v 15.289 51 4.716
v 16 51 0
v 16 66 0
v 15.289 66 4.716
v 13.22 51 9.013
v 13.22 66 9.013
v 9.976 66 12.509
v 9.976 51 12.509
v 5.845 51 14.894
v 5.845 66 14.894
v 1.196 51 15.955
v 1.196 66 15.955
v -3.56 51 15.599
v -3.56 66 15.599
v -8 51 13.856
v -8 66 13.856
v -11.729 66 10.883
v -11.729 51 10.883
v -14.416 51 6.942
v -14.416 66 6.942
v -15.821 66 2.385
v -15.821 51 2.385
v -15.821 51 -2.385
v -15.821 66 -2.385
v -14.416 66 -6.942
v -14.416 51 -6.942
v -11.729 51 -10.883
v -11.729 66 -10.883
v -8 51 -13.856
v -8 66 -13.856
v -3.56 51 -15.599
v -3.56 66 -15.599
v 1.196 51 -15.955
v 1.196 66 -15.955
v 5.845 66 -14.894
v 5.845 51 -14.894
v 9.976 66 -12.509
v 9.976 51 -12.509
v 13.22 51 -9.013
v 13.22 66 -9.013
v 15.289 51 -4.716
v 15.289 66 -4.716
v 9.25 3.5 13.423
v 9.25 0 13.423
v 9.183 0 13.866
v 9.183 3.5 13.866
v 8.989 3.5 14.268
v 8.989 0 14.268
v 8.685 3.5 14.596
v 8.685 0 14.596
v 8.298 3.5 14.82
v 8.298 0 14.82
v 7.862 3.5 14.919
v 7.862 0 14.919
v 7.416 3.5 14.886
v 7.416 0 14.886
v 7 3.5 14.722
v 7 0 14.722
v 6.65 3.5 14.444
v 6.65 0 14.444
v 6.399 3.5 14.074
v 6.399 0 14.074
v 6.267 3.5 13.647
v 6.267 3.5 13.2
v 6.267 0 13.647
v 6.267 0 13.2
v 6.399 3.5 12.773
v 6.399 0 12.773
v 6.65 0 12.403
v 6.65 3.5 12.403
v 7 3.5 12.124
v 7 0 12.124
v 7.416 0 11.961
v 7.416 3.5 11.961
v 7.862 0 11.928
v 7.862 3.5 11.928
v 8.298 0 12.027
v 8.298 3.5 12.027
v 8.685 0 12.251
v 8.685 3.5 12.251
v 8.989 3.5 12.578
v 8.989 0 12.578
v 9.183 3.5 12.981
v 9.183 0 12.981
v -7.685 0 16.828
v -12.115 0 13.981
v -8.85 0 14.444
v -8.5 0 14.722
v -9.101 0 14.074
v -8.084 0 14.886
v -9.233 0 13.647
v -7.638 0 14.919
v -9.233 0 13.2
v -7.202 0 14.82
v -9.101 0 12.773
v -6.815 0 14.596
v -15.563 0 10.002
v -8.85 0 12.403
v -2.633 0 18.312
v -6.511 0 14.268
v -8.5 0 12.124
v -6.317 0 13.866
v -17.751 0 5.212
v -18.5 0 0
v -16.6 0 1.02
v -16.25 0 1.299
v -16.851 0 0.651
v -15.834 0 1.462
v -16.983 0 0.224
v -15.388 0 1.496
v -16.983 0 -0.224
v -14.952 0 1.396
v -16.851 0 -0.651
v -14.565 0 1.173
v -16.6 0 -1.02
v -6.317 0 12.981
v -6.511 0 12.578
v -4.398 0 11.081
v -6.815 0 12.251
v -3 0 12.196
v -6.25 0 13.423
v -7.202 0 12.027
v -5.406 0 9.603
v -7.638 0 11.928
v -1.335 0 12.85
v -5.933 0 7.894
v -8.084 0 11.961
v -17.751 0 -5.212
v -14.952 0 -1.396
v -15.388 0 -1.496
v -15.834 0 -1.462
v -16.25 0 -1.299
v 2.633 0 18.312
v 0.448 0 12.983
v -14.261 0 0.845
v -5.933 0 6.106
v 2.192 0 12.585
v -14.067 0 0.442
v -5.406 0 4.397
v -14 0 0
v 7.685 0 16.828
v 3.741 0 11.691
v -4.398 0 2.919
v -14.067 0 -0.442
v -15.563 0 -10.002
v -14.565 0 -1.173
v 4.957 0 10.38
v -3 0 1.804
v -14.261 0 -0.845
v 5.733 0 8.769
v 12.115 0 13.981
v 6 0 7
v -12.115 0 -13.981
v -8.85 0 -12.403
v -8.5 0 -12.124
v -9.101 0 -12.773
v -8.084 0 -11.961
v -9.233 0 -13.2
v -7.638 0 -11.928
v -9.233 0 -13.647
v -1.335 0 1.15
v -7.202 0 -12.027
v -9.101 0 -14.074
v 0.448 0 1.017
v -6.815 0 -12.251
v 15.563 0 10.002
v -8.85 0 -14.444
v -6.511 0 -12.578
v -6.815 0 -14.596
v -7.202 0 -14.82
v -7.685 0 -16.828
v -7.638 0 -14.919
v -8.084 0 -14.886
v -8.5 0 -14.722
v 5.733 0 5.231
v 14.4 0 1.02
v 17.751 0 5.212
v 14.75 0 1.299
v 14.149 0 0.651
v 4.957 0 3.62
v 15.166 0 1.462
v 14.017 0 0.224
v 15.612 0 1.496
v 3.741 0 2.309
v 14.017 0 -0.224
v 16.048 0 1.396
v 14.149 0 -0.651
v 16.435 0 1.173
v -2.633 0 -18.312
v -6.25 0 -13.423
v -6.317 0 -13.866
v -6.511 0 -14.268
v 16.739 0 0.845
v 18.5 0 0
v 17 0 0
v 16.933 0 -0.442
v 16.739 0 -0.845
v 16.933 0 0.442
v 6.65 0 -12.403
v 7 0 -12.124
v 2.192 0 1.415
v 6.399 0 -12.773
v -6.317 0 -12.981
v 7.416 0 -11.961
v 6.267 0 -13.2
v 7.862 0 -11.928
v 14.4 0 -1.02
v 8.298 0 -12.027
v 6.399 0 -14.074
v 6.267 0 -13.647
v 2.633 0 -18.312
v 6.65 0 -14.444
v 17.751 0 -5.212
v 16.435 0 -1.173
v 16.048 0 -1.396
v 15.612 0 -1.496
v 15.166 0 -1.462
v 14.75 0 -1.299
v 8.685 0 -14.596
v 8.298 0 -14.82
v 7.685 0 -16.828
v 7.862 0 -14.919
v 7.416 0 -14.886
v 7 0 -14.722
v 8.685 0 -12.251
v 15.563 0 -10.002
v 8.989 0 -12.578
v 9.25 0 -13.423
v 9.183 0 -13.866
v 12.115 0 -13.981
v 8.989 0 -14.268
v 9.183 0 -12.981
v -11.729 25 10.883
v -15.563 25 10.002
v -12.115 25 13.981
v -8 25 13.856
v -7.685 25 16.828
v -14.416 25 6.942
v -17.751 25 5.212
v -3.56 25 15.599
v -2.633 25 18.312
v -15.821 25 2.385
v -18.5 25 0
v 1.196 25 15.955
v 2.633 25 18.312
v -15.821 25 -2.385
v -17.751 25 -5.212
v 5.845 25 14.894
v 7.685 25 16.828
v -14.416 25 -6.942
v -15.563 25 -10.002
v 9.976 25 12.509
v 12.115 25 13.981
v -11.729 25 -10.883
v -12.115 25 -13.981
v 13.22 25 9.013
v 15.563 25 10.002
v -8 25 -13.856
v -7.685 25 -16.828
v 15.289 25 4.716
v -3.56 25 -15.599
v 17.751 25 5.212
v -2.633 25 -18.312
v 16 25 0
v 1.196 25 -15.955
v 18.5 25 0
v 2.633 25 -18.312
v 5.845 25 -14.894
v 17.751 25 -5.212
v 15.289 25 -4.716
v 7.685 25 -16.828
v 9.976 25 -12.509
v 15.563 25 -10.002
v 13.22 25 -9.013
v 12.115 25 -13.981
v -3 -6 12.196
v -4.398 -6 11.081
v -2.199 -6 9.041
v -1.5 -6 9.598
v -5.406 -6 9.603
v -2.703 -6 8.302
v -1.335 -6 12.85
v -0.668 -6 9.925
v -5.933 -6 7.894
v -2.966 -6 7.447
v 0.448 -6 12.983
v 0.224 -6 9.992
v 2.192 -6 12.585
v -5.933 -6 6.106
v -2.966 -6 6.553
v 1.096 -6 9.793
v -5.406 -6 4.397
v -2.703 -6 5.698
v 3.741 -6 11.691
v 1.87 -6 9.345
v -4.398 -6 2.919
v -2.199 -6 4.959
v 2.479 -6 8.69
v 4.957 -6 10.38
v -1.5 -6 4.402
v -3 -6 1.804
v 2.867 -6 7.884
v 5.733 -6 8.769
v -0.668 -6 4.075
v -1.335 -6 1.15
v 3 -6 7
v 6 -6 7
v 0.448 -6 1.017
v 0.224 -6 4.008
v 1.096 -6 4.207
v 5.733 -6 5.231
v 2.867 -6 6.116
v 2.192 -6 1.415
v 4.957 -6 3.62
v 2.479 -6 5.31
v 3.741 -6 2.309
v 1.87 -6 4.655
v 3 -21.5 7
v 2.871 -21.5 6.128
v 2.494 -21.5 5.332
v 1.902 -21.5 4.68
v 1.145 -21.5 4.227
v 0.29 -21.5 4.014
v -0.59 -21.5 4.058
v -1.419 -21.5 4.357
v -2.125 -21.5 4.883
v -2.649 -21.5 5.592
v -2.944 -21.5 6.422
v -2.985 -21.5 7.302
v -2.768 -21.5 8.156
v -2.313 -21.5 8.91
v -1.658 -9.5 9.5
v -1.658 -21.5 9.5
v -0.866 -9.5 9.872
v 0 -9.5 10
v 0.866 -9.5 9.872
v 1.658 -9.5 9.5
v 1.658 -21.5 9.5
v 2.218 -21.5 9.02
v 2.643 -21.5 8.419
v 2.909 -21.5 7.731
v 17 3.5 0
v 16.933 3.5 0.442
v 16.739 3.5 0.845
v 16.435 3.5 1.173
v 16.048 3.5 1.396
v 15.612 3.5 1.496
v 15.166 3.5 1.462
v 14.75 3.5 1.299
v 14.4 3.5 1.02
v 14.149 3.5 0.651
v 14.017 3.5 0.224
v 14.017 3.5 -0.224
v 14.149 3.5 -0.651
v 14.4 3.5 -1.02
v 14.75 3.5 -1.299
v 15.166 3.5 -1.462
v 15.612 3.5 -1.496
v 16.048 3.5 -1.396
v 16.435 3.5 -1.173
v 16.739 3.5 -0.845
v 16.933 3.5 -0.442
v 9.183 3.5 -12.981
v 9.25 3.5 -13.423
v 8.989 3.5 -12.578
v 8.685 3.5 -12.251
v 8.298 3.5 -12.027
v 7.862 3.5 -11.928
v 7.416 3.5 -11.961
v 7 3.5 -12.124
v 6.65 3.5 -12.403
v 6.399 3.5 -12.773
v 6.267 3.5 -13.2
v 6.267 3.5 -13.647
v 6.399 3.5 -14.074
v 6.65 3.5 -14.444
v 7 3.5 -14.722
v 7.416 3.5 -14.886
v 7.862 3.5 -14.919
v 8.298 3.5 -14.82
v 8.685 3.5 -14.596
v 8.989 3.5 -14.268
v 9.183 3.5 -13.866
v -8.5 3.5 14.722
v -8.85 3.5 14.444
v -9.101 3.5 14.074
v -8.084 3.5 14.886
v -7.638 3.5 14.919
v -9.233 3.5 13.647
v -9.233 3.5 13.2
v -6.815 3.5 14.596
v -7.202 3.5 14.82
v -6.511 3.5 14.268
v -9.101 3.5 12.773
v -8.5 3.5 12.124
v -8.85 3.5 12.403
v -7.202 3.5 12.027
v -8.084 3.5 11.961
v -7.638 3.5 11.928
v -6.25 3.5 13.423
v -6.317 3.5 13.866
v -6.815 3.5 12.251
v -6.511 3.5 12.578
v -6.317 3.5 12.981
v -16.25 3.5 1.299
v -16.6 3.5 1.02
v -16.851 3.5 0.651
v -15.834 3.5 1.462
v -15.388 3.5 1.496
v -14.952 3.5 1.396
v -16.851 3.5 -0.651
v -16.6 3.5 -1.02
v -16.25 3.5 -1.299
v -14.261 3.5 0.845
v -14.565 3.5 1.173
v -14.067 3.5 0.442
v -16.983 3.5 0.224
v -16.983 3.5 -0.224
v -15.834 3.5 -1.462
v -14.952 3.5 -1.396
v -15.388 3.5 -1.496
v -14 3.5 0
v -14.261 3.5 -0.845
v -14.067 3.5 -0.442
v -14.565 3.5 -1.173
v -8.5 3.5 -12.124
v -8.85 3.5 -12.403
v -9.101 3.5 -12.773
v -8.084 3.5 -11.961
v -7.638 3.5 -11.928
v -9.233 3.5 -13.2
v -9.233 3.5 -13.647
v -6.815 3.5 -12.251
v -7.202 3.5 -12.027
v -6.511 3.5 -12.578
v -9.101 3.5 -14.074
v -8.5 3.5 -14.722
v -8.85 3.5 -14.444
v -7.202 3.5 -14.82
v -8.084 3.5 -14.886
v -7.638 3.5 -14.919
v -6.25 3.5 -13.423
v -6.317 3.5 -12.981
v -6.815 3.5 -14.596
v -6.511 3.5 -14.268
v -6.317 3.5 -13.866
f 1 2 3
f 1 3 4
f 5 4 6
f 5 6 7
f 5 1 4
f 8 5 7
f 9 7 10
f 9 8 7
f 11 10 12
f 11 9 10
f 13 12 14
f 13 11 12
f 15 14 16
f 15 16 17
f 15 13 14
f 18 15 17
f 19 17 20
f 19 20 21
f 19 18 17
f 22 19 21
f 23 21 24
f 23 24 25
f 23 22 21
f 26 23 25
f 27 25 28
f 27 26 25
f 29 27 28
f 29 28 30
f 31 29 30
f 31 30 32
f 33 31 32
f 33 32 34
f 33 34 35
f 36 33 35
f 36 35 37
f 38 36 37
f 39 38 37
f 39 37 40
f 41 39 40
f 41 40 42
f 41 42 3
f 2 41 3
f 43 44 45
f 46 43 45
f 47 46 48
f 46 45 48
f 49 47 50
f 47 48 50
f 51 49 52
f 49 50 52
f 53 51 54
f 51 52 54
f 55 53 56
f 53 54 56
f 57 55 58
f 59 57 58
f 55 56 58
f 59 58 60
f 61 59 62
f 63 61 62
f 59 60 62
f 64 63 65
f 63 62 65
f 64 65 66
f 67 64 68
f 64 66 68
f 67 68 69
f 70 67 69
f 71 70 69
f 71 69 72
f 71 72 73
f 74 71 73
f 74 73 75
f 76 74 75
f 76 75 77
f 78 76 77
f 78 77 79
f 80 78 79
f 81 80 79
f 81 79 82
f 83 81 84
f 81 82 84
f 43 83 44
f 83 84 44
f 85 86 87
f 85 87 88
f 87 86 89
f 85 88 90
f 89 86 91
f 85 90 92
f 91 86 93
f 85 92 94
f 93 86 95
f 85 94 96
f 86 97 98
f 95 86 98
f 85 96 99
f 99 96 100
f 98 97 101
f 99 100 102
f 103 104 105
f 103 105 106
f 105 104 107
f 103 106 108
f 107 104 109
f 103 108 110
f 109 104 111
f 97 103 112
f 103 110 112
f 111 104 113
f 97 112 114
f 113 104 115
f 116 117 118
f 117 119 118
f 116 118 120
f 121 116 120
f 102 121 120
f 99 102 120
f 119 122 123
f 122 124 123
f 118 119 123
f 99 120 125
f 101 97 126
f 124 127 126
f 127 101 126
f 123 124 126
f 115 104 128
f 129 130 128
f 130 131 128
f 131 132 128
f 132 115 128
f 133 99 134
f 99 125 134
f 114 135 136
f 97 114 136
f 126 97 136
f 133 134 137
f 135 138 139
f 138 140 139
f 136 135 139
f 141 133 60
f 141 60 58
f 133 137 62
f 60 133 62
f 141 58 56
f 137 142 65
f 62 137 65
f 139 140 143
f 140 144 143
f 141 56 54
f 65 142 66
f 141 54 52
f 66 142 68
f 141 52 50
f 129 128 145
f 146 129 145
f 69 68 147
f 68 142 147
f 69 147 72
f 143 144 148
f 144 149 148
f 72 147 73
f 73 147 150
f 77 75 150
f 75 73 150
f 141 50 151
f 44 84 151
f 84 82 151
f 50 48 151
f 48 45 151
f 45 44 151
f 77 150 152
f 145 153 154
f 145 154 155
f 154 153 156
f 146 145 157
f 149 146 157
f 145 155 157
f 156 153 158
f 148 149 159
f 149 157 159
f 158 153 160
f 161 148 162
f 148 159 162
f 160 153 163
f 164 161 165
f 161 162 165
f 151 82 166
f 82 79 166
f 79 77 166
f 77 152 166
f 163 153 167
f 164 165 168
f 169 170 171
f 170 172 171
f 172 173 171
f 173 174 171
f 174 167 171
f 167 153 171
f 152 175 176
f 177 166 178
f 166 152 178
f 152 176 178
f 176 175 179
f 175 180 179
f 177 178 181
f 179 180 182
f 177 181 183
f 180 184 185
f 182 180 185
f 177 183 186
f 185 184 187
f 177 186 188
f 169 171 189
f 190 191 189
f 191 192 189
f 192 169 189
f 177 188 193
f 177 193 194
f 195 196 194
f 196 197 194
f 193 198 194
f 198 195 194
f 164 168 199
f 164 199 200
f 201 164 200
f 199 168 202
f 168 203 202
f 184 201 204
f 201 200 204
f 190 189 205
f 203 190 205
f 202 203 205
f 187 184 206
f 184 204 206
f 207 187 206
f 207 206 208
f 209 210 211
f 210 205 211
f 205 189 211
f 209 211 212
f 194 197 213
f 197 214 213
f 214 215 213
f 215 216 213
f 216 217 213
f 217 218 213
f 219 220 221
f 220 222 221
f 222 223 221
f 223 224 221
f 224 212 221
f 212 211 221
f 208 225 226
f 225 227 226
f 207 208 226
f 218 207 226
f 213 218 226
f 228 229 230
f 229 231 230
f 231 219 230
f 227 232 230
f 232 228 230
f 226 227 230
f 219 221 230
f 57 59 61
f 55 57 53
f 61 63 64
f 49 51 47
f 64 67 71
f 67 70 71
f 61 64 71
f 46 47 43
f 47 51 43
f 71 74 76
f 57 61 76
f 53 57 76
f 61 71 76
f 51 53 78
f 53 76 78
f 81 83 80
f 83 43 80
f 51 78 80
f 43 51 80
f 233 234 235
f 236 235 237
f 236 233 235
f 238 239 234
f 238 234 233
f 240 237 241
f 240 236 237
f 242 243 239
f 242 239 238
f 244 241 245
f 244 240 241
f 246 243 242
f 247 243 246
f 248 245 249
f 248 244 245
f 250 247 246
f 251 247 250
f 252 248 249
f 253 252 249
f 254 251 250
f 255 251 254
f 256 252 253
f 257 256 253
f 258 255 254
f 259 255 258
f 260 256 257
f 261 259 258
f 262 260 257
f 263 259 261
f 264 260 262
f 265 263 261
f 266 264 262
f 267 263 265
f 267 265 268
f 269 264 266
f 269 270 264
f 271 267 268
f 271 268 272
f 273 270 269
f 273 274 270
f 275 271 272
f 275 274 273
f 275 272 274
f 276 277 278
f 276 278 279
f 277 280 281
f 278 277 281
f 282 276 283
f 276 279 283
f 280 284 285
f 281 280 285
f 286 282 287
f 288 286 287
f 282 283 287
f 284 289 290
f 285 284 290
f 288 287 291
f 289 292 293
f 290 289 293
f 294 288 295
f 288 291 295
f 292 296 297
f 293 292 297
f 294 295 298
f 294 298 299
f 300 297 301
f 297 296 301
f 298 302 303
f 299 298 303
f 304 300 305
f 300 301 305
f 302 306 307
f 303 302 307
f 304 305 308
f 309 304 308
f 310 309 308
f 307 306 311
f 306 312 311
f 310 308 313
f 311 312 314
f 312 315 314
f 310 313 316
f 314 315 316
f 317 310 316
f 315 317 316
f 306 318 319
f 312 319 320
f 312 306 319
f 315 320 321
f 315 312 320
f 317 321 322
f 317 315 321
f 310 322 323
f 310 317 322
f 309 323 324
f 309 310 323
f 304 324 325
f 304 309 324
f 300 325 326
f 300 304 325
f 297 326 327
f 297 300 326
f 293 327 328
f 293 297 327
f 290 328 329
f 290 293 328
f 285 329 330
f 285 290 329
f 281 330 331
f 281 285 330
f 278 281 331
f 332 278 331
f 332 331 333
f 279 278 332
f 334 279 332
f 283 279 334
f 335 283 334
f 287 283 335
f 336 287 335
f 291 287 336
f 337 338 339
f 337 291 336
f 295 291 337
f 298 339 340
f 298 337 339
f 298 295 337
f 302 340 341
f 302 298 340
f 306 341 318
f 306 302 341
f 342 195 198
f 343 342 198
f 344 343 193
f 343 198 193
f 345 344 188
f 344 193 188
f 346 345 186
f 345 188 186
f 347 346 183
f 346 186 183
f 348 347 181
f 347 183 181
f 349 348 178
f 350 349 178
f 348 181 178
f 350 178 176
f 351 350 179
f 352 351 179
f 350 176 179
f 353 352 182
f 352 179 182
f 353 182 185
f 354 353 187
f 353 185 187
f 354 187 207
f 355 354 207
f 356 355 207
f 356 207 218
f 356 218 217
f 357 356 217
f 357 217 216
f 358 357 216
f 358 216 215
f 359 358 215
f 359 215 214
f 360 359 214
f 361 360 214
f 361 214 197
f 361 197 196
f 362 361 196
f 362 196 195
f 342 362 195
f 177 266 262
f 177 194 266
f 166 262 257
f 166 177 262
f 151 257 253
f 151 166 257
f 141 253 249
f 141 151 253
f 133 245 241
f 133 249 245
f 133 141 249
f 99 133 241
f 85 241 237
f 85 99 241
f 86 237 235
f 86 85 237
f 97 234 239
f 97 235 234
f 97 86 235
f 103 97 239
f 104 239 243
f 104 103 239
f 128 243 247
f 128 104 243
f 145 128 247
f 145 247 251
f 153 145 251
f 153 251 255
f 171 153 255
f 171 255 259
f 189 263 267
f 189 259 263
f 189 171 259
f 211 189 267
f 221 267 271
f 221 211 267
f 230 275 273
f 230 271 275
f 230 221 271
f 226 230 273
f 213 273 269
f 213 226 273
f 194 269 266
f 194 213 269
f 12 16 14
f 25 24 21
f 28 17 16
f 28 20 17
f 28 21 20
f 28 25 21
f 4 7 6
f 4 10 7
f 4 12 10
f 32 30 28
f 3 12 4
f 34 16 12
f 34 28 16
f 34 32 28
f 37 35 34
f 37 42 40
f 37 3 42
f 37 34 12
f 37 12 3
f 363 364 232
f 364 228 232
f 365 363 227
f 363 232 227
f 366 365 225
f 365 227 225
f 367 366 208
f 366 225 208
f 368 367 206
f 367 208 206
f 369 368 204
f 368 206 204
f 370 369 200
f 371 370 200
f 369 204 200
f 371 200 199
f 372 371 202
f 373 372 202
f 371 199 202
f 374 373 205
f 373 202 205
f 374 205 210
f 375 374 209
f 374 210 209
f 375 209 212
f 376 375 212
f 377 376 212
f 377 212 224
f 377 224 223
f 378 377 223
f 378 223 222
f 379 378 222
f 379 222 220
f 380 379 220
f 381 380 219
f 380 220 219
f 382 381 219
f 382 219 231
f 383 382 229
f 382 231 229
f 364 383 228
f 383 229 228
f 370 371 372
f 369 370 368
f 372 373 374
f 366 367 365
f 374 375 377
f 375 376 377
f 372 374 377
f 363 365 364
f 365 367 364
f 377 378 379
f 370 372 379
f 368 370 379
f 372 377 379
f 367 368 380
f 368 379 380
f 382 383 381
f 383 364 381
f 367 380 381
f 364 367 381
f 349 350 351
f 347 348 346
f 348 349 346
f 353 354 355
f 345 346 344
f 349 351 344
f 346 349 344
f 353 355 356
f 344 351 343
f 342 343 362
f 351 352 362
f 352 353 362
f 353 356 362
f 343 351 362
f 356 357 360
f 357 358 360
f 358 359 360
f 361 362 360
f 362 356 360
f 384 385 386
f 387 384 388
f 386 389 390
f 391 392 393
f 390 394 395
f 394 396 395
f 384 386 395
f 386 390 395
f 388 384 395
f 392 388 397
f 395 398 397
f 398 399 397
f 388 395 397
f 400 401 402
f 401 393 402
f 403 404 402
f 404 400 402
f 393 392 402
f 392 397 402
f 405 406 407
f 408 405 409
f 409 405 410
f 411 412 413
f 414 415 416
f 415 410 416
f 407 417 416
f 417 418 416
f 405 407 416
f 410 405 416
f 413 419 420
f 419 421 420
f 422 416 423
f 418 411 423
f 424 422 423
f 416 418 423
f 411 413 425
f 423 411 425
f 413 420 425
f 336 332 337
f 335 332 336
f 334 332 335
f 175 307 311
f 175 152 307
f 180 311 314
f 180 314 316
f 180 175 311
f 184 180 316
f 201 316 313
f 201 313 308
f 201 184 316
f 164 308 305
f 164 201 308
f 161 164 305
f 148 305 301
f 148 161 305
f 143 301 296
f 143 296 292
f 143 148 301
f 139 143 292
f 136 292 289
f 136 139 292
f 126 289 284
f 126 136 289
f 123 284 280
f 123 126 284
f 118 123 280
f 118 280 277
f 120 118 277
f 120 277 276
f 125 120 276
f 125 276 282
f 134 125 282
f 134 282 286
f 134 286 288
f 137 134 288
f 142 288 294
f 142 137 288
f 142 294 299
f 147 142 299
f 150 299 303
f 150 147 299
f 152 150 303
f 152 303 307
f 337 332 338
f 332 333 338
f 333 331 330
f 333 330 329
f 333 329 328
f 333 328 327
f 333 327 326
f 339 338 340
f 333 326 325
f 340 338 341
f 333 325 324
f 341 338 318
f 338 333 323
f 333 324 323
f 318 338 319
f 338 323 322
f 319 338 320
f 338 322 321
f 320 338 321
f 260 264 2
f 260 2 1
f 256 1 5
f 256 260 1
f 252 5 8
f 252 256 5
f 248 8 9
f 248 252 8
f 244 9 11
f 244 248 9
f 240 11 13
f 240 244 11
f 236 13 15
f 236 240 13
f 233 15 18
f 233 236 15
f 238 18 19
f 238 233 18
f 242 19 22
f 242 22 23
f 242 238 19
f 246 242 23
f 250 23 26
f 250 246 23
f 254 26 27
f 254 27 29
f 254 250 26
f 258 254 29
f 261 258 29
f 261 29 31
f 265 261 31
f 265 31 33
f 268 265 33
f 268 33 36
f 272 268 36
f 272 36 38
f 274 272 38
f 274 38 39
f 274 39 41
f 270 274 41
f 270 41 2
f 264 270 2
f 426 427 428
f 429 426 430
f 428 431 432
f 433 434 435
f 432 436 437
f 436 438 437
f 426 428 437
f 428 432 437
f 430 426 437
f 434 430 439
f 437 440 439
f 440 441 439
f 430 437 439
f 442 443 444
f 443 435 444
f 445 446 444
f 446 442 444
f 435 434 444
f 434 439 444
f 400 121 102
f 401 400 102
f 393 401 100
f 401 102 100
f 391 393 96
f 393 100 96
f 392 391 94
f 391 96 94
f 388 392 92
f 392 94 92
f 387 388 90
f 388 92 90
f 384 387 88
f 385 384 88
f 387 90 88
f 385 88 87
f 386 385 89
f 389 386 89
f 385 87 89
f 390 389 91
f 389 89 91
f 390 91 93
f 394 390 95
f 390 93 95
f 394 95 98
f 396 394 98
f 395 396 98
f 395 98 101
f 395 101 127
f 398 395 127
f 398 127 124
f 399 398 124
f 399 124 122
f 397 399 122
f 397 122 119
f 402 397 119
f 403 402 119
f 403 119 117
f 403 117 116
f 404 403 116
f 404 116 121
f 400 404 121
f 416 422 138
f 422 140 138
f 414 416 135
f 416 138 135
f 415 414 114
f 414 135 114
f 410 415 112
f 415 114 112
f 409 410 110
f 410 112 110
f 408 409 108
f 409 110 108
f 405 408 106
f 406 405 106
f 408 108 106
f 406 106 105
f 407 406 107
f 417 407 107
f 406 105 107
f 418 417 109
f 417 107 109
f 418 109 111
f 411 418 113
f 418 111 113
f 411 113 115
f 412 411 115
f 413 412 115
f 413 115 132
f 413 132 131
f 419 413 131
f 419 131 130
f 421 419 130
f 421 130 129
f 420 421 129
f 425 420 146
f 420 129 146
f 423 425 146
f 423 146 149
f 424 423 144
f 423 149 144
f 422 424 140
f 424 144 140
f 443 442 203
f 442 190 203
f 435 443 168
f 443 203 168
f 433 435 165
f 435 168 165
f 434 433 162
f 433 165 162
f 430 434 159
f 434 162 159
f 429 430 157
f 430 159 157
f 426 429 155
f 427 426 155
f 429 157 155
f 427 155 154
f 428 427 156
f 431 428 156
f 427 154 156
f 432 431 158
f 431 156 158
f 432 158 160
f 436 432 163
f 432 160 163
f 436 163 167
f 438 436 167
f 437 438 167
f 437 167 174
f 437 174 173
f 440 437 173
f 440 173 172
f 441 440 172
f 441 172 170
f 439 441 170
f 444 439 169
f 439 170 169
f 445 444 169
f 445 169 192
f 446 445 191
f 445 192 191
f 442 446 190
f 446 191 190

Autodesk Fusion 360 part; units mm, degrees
sketch "Sketch1" plane through (0, 0, 0) normal (0, 1, 0) x (1, 0, 0)
  circle A0 centre (0, 0) radius 18.5
  circle A1 centre (0, 0) radius 16
  circle A2 centre (0, 0) radius 15.5 construction
  line L0 (-18.5, 0) -> (18.5, 0) construction
  circle A3 centre (15.5, 0) radius 1.5
  circle A4 centre (-15.5, 0) radius 1.5
  line L1 (9.25, -16.0215) -> (-9.25, 16.0215) construction
  line L2 (9.25, 16.0215) -> (-9.25, -16.0215) construction
  circle A5 centre (7.75, -13.4234) radius 1.5
  circle A6 centre (-7.75, -13.4234) radius 1.5
  circle A7 centre (-7.75, 13.4234) radius 1.5
  circle A8 centre (7.75, 13.4234) radius 1.5
  line L3 (-14.3875, -7) -> (14.3875, -7) construction
  circle A9 centre (0, -7) radius 3
  circle A10 centre (0, -7) radius 6
  line L4 (-1.6583, -9.5) -> (1.6583, -9.5)
  dimension "d2" = 37
  dimension "d3" = 32
  dimension "d5" = 31
  dimension "d6" = 3
  dimension "d7" = 3
  dimension "d8" = 60
  dimension "d9" = 120
  dimension "d10" = 3
  dimension "d11" = 3
  dimension "d12" = 3
  dimension "d13" = 3
  dimension "d14" = 7
  dimension "d15" = 6
  dimension "d16" = 12
  dimension "d31" = 5.5
extrude "Extrude1" add sketch "Sketch1" along normal blind 25 contours A0 | A1 A3 | A1 A3 | A1 A3 A4 A5 A6 A7 A8 | A1 A8 | A1 A8 | A1 A5 | A1 A5 | A1 A7 | A1 A7 | A1 A6 | A1 A6 | A1 A4 | A1 A4 | A9 L4 | A9 L4 | A10
extrude "Extrude2" add sketch "Sketch1" along normal blind 26 from surface at 25 contours A1 A3 | A1 A3 A4 A5 A6 A7 A8 | A1 A8 | A1 A5 | A1 A7 | A1 A6 | A1 A4 | A9 L4 | A9 L4 | A10 picked at (15.3976, -0.4091) picked at (7.6973, 13.2575) picked at (7.6973, -13.2575) picked at (-7.6523, 13.282) picked at (-7.6523, -13.282) picked at (-15.3286, 0)
extrude "Extrude3" add 1 faces at (-4.5682, 51, 0.742) along direction (0, 1, 0) blind 15
extrude "Extrude4" add sketch "Sketch1" against normal blind 6 contours A9 L4 | A9 L4 | A10
extrude "Extrude5" add sketch "Sketch1" against normal blind 15.5 from surface at -6 contours A9 L4 | A9 L4
extrude "Extrude6" cut sketch "Sketch1" along normal blind 3.5 contours A1 A3 | A1 A3 | A1 A8 | A1 A8 | A1 A5 | A1 A5 | A1 A7 | A1 A7 | A1 A6 | A1 A6 | A1 A4 | A1 A4
extrude "Extrude7" cut sketch "Sketch1" along normal blind 12 from surface at -21.5 contours A9 L4 picked at (0.4253, -9.5717)
